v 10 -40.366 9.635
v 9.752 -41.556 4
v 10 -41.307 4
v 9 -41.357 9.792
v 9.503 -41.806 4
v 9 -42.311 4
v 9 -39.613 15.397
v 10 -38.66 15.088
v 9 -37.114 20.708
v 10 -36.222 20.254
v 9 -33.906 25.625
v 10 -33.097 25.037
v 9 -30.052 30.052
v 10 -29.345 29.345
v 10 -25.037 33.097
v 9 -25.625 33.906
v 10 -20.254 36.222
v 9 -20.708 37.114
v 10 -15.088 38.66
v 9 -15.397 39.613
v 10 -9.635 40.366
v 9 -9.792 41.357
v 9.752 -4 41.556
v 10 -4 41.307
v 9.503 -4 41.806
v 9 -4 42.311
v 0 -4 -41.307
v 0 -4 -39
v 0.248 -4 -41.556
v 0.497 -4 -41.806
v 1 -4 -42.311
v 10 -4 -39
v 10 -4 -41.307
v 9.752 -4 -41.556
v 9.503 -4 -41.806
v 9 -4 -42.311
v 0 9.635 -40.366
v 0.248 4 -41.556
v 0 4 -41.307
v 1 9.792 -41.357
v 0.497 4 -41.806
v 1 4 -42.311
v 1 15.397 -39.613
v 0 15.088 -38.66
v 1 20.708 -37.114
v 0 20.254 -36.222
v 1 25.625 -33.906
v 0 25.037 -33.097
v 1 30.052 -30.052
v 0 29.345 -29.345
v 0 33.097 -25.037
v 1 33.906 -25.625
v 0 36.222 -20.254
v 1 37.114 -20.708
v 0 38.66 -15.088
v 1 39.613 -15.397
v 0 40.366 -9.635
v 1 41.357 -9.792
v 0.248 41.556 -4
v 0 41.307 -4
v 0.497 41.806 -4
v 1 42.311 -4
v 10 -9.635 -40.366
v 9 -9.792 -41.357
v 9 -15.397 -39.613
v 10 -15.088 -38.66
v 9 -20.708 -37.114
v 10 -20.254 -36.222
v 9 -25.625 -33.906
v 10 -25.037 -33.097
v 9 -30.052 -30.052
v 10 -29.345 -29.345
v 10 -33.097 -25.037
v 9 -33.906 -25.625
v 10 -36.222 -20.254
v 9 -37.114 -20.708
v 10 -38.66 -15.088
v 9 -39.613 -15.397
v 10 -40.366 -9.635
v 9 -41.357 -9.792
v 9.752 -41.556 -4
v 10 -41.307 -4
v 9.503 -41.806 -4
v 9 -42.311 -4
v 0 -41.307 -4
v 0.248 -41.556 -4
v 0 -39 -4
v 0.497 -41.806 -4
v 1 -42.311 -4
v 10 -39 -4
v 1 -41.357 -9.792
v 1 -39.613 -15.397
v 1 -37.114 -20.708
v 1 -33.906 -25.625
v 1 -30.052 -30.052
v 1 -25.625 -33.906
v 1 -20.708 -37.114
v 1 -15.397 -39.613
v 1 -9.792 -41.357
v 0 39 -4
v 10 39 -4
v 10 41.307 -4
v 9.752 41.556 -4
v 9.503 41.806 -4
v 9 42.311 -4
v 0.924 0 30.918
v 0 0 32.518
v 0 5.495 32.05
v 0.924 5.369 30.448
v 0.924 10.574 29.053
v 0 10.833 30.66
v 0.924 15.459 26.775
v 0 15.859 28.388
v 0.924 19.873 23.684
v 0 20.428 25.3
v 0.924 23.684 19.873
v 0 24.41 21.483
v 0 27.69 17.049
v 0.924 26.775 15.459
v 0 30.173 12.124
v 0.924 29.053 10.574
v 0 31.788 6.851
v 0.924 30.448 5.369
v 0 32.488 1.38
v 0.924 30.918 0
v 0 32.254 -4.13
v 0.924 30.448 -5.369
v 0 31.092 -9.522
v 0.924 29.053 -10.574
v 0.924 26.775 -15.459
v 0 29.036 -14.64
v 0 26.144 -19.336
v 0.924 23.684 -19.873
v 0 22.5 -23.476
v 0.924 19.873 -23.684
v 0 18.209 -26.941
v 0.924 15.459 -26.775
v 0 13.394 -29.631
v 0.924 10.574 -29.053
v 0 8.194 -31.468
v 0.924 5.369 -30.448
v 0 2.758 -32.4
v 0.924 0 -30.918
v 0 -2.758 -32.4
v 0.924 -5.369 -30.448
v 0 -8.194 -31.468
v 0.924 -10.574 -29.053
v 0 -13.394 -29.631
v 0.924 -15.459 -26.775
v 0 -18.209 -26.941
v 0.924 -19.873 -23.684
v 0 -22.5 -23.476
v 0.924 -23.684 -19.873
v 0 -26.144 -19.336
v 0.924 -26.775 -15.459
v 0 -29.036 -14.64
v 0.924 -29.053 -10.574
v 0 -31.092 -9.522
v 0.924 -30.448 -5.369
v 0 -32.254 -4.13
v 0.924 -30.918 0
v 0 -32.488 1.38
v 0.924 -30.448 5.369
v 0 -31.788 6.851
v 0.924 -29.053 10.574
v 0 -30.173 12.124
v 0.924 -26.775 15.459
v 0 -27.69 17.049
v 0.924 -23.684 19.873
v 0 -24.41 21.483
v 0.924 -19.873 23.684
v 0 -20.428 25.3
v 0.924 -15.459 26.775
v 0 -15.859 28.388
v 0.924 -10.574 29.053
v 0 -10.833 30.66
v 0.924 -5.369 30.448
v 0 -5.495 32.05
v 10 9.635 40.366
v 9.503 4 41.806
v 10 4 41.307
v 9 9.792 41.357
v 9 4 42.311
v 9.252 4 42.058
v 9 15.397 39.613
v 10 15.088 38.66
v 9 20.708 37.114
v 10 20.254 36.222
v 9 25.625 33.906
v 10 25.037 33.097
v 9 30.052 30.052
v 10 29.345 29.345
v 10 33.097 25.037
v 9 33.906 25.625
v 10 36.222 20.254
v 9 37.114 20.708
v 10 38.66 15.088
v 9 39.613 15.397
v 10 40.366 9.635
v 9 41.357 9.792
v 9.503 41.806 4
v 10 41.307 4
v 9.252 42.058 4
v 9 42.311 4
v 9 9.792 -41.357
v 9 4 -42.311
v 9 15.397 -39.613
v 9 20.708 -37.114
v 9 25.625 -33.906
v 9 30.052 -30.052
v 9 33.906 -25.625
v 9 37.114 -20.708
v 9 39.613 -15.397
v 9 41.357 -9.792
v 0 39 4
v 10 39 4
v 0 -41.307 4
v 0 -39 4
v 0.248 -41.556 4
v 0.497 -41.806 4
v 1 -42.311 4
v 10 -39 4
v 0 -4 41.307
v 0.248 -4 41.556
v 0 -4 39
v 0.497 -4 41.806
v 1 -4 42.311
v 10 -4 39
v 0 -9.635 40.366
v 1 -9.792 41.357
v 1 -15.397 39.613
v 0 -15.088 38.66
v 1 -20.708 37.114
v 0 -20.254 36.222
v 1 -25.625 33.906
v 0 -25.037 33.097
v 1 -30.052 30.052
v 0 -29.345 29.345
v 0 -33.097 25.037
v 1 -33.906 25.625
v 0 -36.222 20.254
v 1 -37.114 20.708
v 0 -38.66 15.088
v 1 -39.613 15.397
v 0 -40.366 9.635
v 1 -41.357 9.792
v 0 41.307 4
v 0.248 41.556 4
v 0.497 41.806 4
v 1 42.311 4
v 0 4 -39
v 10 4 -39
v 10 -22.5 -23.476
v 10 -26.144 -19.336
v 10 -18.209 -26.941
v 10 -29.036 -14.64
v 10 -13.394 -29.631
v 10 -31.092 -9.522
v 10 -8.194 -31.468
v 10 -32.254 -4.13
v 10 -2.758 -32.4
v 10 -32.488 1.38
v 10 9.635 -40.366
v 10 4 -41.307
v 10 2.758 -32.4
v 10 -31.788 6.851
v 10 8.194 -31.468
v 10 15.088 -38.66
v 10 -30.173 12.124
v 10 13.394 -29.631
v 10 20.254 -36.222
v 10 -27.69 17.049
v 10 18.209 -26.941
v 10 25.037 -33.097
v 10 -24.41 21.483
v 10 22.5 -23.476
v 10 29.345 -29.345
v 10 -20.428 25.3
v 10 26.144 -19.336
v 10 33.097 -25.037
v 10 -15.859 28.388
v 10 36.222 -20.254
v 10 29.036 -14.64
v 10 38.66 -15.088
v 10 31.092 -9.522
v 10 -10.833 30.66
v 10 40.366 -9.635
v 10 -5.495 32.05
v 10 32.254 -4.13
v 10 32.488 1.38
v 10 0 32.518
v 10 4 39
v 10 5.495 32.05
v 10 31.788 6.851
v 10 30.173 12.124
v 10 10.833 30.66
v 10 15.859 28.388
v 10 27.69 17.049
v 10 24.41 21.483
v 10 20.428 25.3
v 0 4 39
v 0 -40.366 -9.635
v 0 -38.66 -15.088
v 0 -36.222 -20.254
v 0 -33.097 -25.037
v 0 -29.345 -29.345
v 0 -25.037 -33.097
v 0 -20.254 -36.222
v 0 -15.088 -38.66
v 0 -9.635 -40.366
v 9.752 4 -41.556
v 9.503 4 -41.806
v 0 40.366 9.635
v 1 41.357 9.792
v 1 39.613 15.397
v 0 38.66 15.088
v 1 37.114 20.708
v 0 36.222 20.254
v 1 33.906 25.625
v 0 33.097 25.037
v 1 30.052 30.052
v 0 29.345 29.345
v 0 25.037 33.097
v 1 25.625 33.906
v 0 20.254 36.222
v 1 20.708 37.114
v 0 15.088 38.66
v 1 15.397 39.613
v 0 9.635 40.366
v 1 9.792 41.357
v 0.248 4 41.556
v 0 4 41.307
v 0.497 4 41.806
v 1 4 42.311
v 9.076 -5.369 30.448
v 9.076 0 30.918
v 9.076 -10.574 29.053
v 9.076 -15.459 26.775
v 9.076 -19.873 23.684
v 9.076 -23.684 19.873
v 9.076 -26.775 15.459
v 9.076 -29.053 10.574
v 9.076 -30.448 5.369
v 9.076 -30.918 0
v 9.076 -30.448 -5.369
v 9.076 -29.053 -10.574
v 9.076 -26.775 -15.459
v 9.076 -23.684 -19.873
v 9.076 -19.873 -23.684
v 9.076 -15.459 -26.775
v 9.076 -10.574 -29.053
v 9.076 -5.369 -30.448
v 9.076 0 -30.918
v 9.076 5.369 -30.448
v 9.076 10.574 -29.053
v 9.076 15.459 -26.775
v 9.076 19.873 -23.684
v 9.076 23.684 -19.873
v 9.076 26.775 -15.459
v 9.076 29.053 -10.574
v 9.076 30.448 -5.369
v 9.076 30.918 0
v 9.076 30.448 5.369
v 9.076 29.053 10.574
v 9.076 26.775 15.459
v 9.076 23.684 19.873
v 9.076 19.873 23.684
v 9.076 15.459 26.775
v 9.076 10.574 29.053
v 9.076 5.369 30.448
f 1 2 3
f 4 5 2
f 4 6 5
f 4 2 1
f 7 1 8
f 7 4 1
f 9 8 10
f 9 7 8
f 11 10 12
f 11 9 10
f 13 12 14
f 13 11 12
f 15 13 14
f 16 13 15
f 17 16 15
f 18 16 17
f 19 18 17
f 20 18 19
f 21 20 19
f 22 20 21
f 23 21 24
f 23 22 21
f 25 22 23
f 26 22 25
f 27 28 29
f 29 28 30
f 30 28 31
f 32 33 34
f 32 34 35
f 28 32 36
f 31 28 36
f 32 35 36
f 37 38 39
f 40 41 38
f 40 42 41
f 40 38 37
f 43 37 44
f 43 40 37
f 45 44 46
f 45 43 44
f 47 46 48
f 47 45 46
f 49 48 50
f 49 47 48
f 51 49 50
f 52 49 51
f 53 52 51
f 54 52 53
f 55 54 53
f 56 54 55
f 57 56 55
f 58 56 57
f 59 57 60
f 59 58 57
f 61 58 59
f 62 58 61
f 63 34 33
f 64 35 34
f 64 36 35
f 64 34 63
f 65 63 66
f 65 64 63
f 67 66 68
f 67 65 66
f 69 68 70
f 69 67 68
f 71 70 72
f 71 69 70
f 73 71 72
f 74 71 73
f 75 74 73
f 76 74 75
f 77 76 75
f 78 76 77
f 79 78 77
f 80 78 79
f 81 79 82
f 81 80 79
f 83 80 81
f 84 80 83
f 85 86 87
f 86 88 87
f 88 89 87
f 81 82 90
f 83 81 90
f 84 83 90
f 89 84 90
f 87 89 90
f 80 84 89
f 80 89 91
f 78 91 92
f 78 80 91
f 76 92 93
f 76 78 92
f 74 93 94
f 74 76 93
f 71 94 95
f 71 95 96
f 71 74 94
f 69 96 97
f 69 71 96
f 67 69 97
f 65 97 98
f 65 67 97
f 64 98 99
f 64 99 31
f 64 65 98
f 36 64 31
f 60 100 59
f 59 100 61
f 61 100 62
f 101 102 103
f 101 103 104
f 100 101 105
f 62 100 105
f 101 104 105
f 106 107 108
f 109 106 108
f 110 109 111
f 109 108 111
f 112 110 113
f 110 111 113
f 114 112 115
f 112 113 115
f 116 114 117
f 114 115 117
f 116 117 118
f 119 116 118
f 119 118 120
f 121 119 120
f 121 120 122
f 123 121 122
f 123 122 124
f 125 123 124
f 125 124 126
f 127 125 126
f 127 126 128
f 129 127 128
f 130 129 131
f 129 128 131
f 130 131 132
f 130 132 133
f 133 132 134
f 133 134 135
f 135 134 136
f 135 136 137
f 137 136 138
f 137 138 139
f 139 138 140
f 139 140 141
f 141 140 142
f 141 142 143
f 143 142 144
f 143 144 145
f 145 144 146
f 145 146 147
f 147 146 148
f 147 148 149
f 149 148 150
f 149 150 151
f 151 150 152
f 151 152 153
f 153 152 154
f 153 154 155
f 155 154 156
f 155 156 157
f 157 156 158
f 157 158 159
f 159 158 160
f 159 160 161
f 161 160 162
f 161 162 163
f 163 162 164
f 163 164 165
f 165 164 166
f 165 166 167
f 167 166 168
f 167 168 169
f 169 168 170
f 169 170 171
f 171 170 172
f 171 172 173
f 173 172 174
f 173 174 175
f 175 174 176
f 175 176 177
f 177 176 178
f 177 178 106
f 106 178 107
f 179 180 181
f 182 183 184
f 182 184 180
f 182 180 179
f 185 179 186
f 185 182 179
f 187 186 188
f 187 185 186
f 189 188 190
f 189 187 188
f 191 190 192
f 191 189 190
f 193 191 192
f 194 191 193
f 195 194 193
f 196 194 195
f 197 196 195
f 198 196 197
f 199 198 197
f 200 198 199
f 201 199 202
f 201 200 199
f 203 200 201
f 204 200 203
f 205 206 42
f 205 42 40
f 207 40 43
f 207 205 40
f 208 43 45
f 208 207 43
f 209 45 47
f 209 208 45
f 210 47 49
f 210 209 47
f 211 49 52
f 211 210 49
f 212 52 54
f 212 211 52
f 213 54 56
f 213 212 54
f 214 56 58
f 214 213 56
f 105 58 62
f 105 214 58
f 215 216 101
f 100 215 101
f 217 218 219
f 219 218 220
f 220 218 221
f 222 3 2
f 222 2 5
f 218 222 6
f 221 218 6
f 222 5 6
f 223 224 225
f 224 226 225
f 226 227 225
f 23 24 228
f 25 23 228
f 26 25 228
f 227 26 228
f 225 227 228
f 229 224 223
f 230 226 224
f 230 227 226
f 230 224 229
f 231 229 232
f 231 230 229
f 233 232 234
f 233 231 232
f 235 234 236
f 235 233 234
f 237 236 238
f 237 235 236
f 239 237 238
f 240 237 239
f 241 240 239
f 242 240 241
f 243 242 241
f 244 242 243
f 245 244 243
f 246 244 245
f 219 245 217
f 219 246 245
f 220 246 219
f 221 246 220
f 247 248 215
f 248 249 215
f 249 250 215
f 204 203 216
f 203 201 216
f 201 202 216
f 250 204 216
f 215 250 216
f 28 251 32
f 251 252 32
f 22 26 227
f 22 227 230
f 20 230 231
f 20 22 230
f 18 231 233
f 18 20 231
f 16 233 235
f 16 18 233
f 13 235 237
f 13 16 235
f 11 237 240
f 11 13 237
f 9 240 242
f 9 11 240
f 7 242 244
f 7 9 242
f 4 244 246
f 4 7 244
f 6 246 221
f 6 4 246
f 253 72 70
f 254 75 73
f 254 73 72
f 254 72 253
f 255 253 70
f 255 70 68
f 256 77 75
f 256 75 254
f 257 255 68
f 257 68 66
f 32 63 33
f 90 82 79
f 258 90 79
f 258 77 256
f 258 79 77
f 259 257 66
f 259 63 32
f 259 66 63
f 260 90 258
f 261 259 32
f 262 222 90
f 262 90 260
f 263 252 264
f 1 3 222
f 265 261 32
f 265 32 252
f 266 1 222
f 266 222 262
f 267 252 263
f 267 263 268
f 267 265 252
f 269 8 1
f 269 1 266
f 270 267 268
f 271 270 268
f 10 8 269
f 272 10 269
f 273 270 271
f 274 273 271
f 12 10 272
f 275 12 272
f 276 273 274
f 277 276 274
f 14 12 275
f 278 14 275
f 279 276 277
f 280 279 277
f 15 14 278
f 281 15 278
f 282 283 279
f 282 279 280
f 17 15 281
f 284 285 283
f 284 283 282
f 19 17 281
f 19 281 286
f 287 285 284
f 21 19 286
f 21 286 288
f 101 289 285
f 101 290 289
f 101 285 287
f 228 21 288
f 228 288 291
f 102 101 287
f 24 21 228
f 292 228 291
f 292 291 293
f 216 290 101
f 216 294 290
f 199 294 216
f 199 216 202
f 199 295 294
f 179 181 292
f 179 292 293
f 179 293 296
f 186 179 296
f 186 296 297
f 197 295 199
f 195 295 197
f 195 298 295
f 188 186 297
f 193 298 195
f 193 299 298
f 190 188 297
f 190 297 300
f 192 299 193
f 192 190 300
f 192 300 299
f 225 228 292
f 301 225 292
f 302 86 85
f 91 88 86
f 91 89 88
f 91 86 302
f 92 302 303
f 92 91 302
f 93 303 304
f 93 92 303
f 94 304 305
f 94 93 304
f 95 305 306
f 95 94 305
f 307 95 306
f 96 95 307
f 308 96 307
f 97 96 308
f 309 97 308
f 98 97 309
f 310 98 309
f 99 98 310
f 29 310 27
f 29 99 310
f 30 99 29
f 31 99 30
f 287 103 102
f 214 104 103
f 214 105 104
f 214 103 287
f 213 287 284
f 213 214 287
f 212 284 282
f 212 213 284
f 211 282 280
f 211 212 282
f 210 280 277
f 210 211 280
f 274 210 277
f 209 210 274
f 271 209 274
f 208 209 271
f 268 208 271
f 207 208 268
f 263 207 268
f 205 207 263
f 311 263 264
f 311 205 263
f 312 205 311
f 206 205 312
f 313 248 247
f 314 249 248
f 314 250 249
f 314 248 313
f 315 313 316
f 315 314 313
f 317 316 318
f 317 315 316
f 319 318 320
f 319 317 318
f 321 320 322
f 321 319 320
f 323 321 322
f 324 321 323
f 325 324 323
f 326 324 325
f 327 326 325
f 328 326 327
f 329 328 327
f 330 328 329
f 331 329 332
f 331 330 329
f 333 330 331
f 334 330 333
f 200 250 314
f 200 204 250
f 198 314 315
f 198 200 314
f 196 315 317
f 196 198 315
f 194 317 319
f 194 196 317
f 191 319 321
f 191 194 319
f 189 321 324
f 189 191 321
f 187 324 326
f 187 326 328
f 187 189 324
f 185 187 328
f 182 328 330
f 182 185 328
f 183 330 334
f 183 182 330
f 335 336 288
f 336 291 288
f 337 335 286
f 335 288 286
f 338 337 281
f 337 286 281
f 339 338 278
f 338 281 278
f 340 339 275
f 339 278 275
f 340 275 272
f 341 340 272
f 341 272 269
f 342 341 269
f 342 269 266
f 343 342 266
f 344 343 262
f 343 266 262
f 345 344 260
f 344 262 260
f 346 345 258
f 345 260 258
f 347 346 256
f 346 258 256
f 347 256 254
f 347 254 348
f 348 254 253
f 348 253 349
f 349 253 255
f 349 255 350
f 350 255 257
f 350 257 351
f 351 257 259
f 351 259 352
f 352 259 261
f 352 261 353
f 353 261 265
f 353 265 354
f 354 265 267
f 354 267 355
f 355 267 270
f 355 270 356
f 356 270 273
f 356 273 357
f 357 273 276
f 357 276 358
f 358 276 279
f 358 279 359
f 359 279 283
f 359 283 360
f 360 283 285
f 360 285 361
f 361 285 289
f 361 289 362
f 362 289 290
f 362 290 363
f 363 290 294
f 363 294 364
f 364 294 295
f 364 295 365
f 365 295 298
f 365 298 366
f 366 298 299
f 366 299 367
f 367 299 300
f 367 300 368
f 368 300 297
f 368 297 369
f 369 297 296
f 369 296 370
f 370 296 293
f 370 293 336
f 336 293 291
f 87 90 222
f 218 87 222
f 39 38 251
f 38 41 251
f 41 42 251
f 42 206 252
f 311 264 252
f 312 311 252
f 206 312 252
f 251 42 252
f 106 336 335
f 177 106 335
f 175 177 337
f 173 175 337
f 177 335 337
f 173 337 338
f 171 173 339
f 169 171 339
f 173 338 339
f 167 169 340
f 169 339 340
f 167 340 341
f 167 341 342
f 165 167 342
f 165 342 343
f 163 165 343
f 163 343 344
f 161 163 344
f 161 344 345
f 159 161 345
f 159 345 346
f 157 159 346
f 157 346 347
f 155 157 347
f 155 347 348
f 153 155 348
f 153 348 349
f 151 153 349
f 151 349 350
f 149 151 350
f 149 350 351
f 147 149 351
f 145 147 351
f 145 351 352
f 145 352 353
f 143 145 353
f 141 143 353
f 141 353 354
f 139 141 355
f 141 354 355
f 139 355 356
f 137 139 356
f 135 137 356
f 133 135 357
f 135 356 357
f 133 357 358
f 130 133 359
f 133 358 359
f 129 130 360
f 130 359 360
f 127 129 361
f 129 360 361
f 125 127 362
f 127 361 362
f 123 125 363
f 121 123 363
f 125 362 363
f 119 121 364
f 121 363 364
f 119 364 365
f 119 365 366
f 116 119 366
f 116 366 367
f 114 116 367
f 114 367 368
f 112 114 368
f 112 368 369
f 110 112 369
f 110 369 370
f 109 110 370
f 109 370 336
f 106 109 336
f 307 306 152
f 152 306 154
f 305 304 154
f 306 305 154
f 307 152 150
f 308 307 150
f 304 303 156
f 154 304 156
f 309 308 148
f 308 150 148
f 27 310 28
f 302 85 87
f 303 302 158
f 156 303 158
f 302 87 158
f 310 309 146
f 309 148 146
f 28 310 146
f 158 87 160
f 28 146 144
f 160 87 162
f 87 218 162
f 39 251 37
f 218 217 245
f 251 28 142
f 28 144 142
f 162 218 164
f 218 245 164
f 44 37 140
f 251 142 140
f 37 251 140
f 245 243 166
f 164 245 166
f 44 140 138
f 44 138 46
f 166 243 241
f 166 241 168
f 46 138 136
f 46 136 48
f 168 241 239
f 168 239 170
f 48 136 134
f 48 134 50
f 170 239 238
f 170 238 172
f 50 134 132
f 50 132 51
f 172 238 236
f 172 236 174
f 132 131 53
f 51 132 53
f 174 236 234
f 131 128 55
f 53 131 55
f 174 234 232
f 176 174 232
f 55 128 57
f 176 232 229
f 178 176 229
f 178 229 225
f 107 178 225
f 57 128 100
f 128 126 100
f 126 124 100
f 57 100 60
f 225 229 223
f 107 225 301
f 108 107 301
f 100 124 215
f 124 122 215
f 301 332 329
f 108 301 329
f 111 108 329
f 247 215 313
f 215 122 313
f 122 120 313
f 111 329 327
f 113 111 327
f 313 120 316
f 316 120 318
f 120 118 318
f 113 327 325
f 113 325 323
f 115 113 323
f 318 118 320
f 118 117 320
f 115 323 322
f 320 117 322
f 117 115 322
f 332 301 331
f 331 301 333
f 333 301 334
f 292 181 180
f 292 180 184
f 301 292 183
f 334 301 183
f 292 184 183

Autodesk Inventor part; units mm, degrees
ref_plane "YZ Plane" through (0, 0, 0) normal (1, 0, 0) x (0, 1, 0)
ref_plane "XZ Plane" through (0, 0, 0) normal (0, 1, 0) x (-1, 0, 0)
sketch "草图1" plane through (0, 0, 0) normal (0, 0, 1) x (1, 0, 0)
  line L0 (0, 0) -> (10, 0)
  line L1 (0, 0) -> (0, 42.5)
  line L2 (0, 42.5) -> (10, 42.5)
  line L3 (10, 42.5) -> (10, 0)
  line L4 (0, 51) -> (0, -8.5) projected
  line L5 (-2, 0) -> (12, 0) projected
  dimension "d1" = 85
  dimension "d2" = 10
revolve "轴承体" add sketch "草图1" angle 360 about axis through (0, 0, 0) along (1, 0, 0)
sketch "草图2" plane through (0, 0, 0) normal (-1, 0, 0) x (0, 0, 1)
  circle A0 centre (0, 0) radius 42.5 projected
  point P0 (0, 0)
hole "螺纹" at (0, 0, 0) direction (1, 0, 0) diameter 61.835 end through all thread size "M64x2" class "6H" standard "GB Metric profile"
sketch "草图3" plane through (10, 0, 0) normal (1, 0, 0) x (0, 0, -1)
  circle A0 centre (0, 0) radius 42.5 projected
  line L0 (-4, 42.3113) -> (-4, 39)
  line L1 (-4, 39) -> (4, 39)
  line L2 (4, 39) -> (4, 42.3113)
  line L3 (0, -59.5) -> (0, 59.5) projected
  line L4 (-59.5, 0) -> (59.5, 0) projected
  dimension "d12" = 4
  dimension "d13" = 4
  dimension "d14" = 39
extrude "沟槽1" cut sketch "草图3" against normal through all contours L2 L1 L3 A0 | L3 L1 L0 A0
pattern_circular "IDS_ARRAYGROOVE{1}" count 4 over 360 about axis through (-10, 0, 0) along (1, 0, 0) of "沟槽1"
chamfer "倒角1" distance 1 angle 45 4 edges at (0, 30.052, -30.052) (0, 30.052, 30.052) (0, -30.052, -30.052) (0, -30.052, 30.052) measured on face at (0, -20.4276, -32.5865)
chamfer "倒角2" distance 1 angle 45 4 edges at (10, 30.052, 30.052) (10, 30.052, -30.052) (10, -30.052, -30.052) (10, -30.052, 30.052) measured on face at (10, -20.4276, -32.5865)
chamfer "倒角3" distance 1.6 angle 30 1 edges at (10, 0, -30.9175) measured on face at (10, 20.075, -32.0252)
chamfer "倒角4" distance 1.6 angle 30 1 edges at (0, 0, -30.9175) measured on face at (0, -20.075, -32.0252)
ref_plane "Work Plane1" through (120.6234, 0, 0) normal (0, 1, 0) x (-1, 0, 0)
equation "\"d1\" = SD2"
equation "\"d2\" = KOH"
equation "\"d12\" = 0.5 * SNB"
equation "\"d13\" = 0.5 * SNB"
equation "\"d14\" = 0.5 * SD2 - SNT"
equation "\"d10\" = -0.5 * LADI + 0.5 * SD2"
equation "\"d11\" = FAWI"
equation "\"d41\" = -0.5 * LADI + 0.5 * SD2"
equation "\"d25\" = -0.5 * LADI + 0.5 * SD2"
equation "\"d27\" = FAWI"
equation "\"d42\" = -0.5 * LADI + 0.5 * SD2"
equation "\"d18\" = 0.025 * NND"
equation "\"d43\" = 0.025 * NND"
equation "\"d20\" = 0.025 * NND"
equation "\"d44\" = 0.025 * NND"
equation "\"NND\" = 64"
equation "\"KOH\" = 10"
equation "\"SD2\" = 85"
equation "\"SNB\" = 8"
equation "\"SNT\" = 3.5"
equation "\"LADI\" = 83"
equation "\"FAWI\" = 45deg"
equation "\"GUL\" = 0.61345 * PTC"
equation "\"PHH\" = 1"
equation "\"THREADDIA\" = 64"
equation "\"TOA\" = 30deg"
equation "\"PTC\" = 2"
equation "\"FAWI1\" = 60deg"
equation "\"GAL\" = 0.61345 * PTC"
equation "\"GD1\" = THREADDIA - 1.2269 * PTC"
properties part number "螺母 GB 810 M64 x 2" material "钢，软"
